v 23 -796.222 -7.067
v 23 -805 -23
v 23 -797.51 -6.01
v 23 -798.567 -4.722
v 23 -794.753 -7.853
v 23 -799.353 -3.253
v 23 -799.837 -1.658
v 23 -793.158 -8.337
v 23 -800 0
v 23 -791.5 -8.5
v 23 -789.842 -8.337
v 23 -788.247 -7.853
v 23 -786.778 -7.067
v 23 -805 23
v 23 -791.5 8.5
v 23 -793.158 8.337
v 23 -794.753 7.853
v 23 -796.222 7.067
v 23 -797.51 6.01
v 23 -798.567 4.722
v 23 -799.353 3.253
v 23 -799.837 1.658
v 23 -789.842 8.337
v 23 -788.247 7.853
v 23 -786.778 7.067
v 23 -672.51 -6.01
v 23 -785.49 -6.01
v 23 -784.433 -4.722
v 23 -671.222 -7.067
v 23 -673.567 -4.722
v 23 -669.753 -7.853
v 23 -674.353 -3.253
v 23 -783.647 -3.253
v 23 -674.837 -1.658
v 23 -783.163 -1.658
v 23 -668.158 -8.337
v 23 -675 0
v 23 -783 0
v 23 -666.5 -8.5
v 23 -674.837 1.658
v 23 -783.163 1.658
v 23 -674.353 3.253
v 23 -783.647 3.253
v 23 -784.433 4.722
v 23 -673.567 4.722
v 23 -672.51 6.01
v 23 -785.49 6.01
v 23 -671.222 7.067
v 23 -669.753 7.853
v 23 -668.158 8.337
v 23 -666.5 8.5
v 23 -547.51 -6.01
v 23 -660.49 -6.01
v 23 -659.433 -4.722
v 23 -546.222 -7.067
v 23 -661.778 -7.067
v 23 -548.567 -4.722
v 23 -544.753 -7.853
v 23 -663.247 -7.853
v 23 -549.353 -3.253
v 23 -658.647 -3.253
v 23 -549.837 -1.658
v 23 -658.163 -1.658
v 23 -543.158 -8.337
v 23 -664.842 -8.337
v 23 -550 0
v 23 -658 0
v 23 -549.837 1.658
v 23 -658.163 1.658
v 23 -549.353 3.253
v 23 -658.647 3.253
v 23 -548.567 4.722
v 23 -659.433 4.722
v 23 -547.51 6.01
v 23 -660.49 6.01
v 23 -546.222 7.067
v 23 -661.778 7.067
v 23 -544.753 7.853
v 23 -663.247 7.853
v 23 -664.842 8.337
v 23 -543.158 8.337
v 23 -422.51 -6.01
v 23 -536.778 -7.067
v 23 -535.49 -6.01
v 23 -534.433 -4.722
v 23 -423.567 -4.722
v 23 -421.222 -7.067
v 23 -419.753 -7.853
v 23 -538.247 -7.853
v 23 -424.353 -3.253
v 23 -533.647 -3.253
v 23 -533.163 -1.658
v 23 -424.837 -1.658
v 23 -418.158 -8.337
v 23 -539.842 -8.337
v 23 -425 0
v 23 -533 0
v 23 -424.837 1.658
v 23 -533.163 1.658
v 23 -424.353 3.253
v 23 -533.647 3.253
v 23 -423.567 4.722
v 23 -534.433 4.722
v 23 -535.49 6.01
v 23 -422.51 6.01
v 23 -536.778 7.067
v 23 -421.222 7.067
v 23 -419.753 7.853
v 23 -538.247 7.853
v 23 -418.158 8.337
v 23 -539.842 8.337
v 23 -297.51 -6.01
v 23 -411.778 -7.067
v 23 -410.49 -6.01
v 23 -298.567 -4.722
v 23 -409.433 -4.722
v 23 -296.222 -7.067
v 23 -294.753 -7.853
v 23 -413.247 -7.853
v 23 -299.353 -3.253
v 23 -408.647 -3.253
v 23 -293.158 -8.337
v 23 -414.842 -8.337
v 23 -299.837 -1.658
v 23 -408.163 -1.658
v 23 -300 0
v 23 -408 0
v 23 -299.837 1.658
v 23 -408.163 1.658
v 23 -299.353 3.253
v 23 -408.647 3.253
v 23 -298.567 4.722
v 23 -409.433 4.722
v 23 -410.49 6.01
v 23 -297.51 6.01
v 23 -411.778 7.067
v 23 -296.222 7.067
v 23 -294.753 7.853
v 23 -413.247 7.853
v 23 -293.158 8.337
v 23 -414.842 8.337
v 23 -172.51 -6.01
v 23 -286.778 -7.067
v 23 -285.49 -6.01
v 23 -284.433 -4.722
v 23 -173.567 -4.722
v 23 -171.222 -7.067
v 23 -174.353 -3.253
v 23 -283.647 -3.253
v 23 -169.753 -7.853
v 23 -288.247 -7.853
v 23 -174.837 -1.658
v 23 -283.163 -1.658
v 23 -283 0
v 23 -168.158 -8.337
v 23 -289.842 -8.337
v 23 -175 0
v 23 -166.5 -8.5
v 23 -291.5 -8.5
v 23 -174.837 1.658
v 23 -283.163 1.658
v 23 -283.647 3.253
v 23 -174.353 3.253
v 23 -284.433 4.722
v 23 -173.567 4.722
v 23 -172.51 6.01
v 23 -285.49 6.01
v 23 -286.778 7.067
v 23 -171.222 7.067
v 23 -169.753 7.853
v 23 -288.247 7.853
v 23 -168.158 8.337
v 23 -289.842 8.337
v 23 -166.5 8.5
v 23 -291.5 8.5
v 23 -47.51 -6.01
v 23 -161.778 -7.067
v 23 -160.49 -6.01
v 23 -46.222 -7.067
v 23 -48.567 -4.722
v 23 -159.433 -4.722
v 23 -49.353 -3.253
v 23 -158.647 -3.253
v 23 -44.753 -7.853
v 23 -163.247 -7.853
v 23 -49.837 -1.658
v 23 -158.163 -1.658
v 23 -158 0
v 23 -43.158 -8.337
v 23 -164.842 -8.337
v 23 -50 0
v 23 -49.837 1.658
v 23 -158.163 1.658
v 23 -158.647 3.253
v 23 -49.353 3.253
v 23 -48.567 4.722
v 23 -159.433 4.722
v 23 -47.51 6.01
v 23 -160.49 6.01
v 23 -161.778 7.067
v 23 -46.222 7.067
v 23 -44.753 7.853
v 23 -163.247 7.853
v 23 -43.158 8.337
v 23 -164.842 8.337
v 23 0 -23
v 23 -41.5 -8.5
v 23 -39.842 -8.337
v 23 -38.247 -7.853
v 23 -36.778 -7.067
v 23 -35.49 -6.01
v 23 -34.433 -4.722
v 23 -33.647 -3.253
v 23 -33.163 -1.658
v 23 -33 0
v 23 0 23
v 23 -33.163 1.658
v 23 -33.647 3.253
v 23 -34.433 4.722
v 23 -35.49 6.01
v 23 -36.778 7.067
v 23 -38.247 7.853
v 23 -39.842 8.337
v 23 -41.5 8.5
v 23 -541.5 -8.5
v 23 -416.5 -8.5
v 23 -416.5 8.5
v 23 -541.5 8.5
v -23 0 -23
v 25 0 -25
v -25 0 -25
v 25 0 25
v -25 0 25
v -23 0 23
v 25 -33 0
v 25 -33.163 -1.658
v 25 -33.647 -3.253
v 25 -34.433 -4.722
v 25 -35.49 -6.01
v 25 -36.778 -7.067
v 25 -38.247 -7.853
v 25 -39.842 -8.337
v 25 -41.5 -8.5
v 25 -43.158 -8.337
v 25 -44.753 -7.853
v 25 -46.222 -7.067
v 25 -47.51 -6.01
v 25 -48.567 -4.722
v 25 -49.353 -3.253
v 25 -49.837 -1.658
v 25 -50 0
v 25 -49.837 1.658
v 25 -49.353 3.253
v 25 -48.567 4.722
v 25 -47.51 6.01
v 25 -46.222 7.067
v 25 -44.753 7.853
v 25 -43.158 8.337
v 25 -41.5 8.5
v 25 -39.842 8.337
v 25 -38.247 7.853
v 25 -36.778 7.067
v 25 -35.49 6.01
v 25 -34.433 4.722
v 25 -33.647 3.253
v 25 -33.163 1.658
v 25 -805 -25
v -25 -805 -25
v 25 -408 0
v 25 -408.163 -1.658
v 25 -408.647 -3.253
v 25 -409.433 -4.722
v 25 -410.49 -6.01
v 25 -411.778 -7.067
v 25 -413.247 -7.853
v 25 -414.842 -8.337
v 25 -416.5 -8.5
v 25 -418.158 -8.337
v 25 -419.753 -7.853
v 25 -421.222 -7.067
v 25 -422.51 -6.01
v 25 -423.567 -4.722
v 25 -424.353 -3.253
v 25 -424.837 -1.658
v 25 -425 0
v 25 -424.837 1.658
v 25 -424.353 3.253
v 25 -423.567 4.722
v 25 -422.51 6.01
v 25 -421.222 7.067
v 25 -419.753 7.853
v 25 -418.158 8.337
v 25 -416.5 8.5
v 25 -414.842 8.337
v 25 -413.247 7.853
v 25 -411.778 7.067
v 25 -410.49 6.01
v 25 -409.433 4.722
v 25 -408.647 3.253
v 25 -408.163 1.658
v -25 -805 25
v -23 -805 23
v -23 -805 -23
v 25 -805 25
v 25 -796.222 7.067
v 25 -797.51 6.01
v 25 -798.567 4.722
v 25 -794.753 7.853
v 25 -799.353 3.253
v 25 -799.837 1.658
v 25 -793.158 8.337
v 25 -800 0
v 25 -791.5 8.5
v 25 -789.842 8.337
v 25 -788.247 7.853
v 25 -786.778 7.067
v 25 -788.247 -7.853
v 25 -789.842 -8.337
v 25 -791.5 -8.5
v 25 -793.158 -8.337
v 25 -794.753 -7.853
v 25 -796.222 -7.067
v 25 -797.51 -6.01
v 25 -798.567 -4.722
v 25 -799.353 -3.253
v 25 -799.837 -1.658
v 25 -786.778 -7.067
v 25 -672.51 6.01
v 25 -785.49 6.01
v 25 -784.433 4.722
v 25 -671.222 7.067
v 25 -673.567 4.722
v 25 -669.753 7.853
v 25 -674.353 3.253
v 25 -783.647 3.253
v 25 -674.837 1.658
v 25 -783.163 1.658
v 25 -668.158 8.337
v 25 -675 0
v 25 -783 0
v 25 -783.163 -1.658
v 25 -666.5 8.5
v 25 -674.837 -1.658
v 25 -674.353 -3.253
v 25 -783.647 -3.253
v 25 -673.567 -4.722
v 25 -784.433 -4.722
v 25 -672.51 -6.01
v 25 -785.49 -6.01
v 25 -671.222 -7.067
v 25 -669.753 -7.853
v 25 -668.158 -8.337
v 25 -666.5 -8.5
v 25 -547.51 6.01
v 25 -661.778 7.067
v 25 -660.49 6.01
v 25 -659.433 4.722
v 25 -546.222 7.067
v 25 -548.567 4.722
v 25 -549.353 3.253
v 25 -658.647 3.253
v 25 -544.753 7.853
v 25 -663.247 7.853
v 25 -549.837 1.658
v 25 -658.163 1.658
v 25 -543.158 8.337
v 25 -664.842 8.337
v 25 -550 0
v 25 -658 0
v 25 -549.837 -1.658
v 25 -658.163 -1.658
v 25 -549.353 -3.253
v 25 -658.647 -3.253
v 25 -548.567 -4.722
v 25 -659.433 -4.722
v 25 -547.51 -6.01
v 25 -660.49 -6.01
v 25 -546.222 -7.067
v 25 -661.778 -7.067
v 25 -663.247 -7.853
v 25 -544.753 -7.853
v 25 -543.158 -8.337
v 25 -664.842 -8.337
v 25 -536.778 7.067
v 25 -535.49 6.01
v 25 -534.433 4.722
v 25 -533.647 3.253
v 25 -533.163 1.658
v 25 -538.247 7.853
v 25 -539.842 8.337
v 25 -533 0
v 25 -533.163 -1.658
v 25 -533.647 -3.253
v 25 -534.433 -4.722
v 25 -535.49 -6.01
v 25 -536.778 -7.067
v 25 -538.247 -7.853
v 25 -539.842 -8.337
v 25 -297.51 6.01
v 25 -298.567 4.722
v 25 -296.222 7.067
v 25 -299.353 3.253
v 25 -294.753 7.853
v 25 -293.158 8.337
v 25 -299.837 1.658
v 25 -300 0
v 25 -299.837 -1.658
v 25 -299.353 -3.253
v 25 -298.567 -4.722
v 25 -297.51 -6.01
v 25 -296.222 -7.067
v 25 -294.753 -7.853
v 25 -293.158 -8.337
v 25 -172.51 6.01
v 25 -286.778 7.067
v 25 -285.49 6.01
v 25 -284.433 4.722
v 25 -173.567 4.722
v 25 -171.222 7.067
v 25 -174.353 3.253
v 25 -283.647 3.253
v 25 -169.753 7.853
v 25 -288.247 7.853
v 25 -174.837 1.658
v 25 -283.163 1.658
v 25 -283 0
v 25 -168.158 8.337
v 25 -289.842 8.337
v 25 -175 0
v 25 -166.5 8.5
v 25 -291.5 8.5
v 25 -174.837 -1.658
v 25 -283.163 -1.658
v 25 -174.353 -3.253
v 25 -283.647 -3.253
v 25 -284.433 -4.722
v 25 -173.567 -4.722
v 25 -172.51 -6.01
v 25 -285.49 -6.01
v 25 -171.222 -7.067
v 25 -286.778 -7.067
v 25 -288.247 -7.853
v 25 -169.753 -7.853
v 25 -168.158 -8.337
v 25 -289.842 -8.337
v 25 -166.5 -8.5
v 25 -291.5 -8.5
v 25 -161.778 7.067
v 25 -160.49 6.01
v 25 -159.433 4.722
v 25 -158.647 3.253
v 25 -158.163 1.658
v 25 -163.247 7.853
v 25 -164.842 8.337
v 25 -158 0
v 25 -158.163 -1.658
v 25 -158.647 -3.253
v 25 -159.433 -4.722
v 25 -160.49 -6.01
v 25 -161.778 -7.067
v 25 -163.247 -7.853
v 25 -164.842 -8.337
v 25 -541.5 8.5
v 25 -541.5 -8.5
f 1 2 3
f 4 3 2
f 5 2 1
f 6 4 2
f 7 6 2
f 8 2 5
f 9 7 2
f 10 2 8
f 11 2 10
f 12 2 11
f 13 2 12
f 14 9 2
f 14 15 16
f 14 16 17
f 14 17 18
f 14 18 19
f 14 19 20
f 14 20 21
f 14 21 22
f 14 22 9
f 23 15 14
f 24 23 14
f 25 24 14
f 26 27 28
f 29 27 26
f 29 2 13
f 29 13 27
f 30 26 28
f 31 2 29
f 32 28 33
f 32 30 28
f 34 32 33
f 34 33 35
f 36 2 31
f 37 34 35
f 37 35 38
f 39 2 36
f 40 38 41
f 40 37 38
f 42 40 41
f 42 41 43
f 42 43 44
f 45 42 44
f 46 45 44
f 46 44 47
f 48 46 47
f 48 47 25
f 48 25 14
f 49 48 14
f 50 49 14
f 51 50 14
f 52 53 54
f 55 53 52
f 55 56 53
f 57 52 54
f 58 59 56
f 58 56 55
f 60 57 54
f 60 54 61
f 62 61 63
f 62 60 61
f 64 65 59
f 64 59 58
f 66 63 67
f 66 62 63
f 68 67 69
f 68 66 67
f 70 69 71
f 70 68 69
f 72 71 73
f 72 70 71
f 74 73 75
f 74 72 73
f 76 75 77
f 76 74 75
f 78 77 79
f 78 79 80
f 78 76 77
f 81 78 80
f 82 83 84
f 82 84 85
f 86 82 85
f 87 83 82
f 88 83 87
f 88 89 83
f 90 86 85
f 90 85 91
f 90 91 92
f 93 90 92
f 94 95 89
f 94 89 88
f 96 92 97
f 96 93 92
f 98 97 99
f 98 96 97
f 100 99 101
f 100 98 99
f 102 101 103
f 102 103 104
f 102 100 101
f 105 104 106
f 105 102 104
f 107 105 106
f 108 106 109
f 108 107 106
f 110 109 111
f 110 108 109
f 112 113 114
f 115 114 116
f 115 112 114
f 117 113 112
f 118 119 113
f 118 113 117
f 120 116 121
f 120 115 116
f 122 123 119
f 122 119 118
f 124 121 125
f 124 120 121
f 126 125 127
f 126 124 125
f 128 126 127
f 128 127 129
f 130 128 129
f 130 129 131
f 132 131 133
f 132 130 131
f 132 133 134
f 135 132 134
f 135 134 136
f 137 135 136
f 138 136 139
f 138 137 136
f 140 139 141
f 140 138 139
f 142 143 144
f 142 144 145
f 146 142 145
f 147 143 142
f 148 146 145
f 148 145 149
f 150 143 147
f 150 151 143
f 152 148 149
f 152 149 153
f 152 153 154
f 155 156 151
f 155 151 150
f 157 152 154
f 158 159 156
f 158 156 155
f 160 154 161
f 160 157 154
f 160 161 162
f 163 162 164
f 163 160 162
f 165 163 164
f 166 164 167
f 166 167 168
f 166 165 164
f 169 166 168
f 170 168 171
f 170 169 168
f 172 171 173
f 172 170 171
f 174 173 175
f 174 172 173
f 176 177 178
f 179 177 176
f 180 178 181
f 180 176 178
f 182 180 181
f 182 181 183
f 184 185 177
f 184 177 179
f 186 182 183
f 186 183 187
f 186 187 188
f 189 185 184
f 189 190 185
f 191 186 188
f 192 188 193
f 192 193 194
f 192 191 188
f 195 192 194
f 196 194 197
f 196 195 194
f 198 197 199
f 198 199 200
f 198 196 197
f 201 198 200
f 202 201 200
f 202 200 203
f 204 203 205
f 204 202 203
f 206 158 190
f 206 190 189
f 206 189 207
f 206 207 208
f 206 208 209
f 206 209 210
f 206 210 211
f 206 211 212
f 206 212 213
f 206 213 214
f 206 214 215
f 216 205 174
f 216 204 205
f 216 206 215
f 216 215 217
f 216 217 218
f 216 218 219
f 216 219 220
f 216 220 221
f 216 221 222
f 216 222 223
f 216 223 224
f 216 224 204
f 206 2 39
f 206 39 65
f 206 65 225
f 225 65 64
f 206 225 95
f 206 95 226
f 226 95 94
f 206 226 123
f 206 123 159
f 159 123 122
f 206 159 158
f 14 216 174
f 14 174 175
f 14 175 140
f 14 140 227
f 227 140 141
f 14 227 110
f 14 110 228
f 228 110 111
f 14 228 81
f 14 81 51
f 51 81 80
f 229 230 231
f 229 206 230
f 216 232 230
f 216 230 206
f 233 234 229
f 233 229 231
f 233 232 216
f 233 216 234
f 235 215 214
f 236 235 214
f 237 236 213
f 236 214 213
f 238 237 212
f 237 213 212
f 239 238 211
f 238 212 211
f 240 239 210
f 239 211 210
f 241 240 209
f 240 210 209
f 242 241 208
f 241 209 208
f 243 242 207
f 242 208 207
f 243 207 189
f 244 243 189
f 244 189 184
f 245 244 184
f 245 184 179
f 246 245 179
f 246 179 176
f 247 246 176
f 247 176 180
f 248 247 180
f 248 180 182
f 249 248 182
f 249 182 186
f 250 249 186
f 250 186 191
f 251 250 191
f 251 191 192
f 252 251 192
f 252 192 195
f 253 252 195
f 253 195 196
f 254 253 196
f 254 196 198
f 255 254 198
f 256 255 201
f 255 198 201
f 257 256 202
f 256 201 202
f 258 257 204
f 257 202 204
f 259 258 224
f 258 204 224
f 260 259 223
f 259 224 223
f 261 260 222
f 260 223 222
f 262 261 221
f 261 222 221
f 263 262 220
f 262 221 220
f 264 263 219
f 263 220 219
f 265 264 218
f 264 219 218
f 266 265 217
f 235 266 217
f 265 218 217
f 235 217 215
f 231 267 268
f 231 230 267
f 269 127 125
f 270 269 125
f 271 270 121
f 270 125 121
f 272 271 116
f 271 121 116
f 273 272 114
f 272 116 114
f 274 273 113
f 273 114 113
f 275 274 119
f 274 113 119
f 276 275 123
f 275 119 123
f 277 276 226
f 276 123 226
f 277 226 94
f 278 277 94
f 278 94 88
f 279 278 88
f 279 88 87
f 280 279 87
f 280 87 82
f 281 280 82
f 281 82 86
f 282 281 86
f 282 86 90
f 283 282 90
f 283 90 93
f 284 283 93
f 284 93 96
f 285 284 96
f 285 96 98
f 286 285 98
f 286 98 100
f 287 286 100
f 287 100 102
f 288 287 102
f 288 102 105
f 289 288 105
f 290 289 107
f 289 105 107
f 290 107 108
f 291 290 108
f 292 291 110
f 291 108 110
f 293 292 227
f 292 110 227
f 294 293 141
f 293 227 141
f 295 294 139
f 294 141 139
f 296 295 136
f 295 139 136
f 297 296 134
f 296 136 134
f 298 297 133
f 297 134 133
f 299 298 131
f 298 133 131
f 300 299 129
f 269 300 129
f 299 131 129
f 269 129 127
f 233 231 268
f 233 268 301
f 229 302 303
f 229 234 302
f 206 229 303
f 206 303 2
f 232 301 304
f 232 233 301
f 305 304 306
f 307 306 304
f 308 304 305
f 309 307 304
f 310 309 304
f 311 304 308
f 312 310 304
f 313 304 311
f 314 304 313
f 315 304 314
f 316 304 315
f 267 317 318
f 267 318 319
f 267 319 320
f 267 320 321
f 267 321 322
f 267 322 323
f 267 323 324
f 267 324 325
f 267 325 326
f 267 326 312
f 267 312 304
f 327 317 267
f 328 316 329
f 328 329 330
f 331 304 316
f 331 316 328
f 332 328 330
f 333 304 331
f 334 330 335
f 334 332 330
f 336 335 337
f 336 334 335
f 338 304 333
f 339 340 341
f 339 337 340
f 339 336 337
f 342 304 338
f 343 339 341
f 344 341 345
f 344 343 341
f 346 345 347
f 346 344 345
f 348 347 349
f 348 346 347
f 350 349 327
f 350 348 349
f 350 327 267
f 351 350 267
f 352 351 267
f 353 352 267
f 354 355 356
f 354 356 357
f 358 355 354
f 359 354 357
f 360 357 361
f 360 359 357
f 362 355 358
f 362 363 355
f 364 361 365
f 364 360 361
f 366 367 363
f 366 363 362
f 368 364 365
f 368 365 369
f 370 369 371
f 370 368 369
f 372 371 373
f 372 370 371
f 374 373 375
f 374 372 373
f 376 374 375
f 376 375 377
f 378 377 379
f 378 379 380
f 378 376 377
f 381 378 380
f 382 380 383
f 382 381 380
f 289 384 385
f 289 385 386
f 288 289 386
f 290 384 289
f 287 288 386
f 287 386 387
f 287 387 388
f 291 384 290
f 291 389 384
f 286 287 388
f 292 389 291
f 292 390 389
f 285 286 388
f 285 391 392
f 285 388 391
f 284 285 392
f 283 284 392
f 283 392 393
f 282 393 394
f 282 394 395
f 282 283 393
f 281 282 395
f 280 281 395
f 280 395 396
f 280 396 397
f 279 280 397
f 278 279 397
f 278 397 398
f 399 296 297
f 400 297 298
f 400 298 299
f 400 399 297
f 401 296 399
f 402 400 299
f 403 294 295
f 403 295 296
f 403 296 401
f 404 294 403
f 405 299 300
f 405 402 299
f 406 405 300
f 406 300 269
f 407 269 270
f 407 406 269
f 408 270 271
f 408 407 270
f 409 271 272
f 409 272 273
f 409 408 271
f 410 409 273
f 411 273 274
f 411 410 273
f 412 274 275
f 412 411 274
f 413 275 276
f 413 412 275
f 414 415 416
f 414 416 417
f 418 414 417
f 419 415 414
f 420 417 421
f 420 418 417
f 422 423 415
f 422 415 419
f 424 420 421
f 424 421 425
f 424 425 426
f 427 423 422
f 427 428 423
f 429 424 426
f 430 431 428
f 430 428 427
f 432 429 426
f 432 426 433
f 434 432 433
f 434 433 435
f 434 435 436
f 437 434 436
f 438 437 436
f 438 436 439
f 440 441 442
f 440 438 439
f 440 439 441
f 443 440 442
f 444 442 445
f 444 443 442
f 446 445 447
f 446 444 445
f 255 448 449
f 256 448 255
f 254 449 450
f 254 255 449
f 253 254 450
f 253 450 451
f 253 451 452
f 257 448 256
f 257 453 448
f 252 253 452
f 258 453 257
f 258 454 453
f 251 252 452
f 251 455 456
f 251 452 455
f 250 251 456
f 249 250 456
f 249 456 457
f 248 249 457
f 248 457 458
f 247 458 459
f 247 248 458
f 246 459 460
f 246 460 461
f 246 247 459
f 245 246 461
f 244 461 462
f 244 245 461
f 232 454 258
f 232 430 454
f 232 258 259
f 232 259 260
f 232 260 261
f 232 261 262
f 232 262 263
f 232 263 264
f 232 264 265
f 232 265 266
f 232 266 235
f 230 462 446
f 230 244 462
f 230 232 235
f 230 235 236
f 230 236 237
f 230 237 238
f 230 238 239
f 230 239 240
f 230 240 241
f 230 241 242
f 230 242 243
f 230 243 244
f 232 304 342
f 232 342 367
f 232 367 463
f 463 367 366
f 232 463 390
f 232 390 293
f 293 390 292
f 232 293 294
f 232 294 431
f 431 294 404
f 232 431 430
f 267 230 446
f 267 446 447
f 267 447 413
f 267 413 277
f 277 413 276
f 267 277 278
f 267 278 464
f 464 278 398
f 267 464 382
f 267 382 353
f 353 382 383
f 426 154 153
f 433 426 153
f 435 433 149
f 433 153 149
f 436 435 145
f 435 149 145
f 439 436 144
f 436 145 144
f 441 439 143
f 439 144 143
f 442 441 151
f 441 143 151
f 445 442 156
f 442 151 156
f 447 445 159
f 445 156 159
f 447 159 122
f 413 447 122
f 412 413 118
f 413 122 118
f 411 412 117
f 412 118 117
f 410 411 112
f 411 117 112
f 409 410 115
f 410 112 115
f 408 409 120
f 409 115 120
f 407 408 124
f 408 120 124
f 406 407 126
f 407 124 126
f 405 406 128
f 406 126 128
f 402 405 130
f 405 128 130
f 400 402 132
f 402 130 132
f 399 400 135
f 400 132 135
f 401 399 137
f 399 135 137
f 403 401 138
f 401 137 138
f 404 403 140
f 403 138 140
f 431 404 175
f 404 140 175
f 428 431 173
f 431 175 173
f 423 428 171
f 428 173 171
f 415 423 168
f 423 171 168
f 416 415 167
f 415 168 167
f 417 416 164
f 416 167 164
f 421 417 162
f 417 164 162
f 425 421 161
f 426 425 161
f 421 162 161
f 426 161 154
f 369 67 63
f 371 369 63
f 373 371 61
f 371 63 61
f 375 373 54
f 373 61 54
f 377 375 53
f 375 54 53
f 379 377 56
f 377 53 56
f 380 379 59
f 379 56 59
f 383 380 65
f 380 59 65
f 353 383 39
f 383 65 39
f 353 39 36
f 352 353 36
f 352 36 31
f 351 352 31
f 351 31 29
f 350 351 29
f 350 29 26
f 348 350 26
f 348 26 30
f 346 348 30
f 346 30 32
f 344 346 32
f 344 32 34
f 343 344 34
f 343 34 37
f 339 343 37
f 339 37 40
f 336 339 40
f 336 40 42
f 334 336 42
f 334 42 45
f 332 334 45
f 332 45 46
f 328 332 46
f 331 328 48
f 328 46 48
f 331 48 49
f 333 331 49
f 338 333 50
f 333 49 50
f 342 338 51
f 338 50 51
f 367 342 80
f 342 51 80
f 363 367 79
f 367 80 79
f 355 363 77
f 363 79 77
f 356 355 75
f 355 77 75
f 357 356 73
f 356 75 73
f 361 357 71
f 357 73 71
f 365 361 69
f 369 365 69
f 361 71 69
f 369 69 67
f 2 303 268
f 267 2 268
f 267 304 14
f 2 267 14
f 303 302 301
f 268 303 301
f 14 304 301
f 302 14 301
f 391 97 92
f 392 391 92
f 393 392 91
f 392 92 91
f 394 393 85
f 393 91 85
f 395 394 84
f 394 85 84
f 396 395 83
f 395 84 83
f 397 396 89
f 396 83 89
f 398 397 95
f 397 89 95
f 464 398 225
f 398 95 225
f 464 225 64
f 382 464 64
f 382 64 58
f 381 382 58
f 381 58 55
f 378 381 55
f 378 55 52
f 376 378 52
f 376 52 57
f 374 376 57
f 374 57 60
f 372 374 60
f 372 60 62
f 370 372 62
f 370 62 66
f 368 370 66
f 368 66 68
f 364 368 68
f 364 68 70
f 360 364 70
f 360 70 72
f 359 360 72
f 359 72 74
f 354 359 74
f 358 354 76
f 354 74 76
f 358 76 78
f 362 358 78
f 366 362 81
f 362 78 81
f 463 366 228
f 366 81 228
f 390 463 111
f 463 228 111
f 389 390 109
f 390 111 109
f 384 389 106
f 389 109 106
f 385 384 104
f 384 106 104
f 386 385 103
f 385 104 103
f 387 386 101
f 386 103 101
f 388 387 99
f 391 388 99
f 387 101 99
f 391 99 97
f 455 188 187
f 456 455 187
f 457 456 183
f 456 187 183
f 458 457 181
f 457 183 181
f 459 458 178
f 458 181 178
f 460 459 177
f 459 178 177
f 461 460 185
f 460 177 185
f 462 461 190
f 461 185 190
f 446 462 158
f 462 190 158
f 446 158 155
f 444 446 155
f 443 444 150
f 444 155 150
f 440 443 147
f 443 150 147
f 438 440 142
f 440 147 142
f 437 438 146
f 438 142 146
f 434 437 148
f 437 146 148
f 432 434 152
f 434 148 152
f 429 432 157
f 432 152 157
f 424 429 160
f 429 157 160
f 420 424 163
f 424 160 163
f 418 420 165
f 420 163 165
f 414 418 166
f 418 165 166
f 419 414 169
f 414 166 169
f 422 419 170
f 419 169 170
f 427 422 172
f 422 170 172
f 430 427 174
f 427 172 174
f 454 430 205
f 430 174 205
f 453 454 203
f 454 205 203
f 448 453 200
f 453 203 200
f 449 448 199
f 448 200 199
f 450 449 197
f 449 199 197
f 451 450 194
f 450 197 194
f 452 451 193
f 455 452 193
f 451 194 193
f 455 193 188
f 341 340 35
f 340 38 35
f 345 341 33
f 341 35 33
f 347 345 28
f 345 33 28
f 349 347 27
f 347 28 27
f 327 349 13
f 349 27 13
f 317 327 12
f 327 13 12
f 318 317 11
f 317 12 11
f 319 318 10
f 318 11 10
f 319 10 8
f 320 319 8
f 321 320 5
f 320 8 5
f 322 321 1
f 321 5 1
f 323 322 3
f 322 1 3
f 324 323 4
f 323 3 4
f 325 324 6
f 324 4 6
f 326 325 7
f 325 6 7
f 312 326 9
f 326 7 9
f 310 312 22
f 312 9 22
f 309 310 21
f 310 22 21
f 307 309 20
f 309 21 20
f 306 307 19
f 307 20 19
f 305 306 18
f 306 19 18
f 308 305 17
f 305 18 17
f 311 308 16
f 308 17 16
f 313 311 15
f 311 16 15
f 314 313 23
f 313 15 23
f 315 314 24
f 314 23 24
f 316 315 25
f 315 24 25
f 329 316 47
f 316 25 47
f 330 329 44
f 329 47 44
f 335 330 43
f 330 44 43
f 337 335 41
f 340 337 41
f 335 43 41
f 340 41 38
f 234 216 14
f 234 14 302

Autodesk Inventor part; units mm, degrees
ref_plane "YZ Plane" through (0, 0, 0) normal (1, 0, 0) x (0, 1, 0)
ref_plane "XZ Plane" through (0, 0, 0) normal (0, 1, 0) x (-1, 0, 0)
ref_plane "XY Plane" through (0, 0, 0) normal (0, 0, 1) x (1, 0, 0)
sketch "Sketch9" plane through (0, 0, 0) normal (0, 1, 0) x (-1, 0, 0)
  line L0 (25, 25) -> (-25, 25)
  line L1 (-25, 25) -> (-25, -25)
  line L2 (-25, -25) -> (25, -25)
  line L3 (25, -25) -> (25, 25)
  line L4 (25, 25) -> (-25, -25) construction
  line L5 (-25, 25) -> (25, -25) construction
  line L6 (-23, 23) -> (23, 23)
  line L7 (23, 23) -> (23, -23)
  line L8 (23, -23) -> (-23, -23)
  line L9 (-23, -23) -> (-23, 23)
  point P0 (0, 0)
  dimension "d172" = 50
  dimension "d173" = 50
  dimension "d174" = 2
extrude "Extrusion3" add sketch "Sketch9" against normal blind 805
sketch "Sketch10" plane through (0, 0, 0) normal (1, 0, 0) x (0, 1, 0)
  line L0 (0, 25) -> (0, -25) construction
  line L1 (0, 25) -> (-805, 25) construction
  line L2 (-805, -25) -> (-805, 25) construction
  line L3 (0, -25) -> (-805, -25) construction
  line L4 (-800, 8.5) -> (-783, 8.5)
  line L5 (-783, 8.5) -> (-783, -8.5)
  line L6 (-783, -8.5) -> (-800, -8.5)
  line L7 (-800, -8.5) -> (-800, 8.5)
  line L8 (-800, 8.5) -> (-783, -8.5) construction
  line L9 (-783, 8.5) -> (-800, -8.5) construction
  circle A0 centre (-791.5, 0) radius 8.5
  line L10 (0, 25) -> (0, -25) projected
  point P0 (0, 0)
  point P1 (0, 0)
  point P2 (-805, 0)
  dimension "d177" = 17
  dimension "d178" = 17
  dimension "d191" = 5
extrude "Extrusion4" cut sketch "Sketch10" along normal through all contours A0
pattern_linear "Rectangular Pattern4" count 7 spacing 125 along (0, 1, 0) of "Extrusion4"
properties part number "TKS 3536 FDS WAY tube6" material "Stainless Steel"
